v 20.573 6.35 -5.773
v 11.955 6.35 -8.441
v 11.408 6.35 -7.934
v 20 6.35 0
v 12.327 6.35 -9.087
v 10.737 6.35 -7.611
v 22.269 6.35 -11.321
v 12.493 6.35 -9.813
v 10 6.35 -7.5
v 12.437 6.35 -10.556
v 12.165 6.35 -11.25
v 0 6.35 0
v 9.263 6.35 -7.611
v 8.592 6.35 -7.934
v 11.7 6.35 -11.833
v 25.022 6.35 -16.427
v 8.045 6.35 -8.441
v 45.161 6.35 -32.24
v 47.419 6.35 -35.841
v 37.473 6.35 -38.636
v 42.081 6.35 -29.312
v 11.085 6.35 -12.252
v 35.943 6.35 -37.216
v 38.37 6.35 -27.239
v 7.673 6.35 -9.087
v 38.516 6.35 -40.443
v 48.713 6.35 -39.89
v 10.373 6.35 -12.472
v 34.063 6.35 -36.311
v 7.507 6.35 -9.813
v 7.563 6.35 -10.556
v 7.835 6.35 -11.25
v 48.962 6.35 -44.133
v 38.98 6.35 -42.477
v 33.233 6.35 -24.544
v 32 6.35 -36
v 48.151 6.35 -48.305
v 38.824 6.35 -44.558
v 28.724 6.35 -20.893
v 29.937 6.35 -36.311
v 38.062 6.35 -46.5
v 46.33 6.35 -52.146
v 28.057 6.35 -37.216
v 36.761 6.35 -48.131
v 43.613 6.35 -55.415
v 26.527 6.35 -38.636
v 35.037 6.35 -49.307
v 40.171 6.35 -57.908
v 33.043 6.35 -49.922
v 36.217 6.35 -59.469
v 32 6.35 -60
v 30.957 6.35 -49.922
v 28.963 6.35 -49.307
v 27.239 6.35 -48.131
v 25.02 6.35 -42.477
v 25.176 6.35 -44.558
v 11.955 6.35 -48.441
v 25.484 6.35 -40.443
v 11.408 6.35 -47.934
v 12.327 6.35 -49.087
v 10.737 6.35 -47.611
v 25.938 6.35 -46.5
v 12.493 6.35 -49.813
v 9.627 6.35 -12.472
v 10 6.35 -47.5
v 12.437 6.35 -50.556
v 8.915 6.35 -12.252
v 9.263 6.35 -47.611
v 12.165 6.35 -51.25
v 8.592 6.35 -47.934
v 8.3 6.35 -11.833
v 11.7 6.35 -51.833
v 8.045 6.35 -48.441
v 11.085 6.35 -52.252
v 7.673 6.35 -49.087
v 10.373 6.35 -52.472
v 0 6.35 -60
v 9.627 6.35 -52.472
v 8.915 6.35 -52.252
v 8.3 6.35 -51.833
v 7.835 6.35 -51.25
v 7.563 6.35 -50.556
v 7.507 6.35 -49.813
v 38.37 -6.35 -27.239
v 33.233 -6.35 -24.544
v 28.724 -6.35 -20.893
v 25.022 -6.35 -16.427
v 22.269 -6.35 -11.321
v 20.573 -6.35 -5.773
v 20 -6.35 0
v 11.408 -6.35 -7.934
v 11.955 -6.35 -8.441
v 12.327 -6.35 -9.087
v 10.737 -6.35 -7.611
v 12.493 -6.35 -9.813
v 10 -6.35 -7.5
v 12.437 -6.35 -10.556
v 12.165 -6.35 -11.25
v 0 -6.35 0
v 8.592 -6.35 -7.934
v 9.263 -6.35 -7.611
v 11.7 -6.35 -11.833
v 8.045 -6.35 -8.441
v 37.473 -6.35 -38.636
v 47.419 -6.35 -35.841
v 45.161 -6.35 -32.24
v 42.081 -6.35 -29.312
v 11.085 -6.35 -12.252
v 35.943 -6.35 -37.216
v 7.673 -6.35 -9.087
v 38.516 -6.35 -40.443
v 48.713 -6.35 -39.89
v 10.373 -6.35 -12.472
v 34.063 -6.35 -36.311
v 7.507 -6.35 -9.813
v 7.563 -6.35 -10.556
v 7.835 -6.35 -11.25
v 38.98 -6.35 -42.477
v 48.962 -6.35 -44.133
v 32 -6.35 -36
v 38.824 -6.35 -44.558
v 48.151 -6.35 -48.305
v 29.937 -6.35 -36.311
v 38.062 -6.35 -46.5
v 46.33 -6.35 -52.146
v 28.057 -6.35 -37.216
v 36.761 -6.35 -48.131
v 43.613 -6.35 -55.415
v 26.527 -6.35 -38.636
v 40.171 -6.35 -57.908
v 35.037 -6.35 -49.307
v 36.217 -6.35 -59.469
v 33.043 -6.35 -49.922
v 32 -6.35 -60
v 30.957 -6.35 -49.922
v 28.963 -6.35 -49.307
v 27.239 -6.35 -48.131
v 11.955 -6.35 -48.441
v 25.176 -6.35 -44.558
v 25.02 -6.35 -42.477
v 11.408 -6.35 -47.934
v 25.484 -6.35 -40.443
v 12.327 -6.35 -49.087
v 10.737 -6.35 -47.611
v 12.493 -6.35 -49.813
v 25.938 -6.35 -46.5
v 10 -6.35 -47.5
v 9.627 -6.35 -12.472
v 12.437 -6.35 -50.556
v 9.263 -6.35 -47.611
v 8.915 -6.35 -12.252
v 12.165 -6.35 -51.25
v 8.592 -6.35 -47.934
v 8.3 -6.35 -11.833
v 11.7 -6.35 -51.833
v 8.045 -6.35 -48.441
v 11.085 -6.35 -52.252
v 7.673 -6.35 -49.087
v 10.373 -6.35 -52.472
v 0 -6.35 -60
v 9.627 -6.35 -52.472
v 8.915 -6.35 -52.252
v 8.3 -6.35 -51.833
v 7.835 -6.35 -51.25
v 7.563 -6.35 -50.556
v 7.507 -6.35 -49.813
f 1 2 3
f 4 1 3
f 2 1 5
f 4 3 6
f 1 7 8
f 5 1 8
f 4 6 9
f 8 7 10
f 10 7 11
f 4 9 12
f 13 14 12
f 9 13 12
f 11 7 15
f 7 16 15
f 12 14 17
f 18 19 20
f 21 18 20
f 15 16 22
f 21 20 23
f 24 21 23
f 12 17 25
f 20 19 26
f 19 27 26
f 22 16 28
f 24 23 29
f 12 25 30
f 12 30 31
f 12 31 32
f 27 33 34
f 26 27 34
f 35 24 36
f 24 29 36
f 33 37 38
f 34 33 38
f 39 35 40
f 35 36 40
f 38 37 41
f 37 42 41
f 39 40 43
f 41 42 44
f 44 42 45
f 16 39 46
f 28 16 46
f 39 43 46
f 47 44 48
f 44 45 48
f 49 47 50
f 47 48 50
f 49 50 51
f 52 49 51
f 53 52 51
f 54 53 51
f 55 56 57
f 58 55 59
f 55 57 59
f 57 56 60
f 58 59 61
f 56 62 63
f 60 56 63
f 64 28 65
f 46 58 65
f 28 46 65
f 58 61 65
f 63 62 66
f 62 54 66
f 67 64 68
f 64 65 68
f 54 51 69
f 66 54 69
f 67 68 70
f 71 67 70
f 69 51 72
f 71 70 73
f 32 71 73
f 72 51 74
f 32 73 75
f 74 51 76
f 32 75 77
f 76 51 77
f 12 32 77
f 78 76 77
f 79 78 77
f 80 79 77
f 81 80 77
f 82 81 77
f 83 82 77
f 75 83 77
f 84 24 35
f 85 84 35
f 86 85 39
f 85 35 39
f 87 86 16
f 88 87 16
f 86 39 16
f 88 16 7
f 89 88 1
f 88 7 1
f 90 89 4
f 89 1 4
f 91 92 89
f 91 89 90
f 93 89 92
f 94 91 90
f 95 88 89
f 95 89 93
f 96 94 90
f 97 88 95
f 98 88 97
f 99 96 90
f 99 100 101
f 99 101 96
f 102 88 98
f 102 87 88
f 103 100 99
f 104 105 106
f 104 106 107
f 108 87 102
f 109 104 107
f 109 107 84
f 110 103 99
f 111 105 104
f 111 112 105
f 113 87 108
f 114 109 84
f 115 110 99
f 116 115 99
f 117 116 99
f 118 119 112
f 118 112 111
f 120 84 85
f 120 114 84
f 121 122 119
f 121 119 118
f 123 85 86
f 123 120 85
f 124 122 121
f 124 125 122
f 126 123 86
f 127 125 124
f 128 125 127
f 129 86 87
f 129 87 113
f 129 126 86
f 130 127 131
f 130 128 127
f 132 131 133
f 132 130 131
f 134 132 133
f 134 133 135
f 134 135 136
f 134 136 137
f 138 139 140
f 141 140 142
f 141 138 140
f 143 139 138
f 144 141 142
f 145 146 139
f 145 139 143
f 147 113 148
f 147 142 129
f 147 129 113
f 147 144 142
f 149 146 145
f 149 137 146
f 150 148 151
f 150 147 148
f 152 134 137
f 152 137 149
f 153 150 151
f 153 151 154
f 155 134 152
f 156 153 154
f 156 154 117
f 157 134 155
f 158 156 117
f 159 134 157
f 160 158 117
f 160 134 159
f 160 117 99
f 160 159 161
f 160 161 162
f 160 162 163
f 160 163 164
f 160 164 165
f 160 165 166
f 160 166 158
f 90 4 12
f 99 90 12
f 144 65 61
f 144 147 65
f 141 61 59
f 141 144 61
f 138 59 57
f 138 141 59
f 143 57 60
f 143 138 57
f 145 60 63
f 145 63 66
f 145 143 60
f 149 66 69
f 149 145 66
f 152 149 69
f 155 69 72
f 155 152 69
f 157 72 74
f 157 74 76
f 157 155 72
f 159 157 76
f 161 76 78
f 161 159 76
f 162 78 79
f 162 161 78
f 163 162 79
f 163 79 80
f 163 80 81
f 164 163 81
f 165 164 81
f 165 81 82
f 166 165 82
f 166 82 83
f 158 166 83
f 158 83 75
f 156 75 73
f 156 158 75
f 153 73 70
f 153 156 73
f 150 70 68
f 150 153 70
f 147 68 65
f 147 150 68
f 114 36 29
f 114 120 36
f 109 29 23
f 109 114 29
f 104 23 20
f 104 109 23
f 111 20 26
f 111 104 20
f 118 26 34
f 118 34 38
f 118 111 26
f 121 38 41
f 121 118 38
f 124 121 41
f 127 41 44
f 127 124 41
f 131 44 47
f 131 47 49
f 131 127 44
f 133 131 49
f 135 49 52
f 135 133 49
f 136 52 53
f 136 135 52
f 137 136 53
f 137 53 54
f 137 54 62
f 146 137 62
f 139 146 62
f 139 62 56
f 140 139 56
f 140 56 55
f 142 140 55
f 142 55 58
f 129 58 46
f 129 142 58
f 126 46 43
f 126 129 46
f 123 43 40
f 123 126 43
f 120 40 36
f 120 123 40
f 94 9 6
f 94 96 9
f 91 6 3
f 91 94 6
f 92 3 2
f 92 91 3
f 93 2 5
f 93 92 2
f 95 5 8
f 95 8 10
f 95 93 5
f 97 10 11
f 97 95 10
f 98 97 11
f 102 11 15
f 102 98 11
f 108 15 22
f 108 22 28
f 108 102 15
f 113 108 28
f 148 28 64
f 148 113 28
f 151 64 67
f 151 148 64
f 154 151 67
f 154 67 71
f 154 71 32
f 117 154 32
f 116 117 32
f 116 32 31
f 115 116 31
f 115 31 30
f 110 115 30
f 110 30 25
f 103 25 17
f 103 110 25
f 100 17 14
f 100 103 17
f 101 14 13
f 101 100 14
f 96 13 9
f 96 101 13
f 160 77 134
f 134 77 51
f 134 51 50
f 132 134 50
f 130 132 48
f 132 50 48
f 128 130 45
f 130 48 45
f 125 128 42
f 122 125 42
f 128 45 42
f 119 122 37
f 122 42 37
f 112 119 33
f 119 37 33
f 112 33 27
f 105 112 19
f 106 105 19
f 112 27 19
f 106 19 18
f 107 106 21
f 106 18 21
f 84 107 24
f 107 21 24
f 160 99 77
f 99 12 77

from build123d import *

# Parameters (mm, degrees)
SKETCH1_R           = 7
SKETCH1_R_2         = 2.5
BOSS_EXTRUDE1_DEPTH = 6.35


with BuildPart() as part:
    # Sketch1 → Boss-Extrude1 (new, symmetric)
    with BuildSketch(Plane(origin=(0, 0, 0), x_dir=(1, 0, 0), z_dir=(0, 1, 0))):
        with BuildLine():
            Line((20, 0), (0, 0))
            Line((0, 0), (0, 60))
            Line((0, 60), (32, 60))
            ThreePointArc((32, 60), (48.687461624, 46.244784205), (38.370260223, 27.23866171))
            ThreePointArc((38.370260223, 27.23866171), (25.021742974, 16.427196599), (20, 0))
        make_face()
        with Locations(Location((32, 43, 0), (0, 0, 270))):
            Circle(SKETCH1_R, mode=Mode.SUBTRACT)
        with Locations(Location((10, 10, 0), (0, 0, 270))):
            Circle(SKETCH1_R_2, mode=Mode.SUBTRACT)
        with Locations(Location((10, 50, 0), (0, 0, 270))):
            Circle(SKETCH1_R_2, mode=Mode.SUBTRACT)
    extrude(amount=BOSS_EXTRUDE1_DEPTH, both=True)


solid = part.part
